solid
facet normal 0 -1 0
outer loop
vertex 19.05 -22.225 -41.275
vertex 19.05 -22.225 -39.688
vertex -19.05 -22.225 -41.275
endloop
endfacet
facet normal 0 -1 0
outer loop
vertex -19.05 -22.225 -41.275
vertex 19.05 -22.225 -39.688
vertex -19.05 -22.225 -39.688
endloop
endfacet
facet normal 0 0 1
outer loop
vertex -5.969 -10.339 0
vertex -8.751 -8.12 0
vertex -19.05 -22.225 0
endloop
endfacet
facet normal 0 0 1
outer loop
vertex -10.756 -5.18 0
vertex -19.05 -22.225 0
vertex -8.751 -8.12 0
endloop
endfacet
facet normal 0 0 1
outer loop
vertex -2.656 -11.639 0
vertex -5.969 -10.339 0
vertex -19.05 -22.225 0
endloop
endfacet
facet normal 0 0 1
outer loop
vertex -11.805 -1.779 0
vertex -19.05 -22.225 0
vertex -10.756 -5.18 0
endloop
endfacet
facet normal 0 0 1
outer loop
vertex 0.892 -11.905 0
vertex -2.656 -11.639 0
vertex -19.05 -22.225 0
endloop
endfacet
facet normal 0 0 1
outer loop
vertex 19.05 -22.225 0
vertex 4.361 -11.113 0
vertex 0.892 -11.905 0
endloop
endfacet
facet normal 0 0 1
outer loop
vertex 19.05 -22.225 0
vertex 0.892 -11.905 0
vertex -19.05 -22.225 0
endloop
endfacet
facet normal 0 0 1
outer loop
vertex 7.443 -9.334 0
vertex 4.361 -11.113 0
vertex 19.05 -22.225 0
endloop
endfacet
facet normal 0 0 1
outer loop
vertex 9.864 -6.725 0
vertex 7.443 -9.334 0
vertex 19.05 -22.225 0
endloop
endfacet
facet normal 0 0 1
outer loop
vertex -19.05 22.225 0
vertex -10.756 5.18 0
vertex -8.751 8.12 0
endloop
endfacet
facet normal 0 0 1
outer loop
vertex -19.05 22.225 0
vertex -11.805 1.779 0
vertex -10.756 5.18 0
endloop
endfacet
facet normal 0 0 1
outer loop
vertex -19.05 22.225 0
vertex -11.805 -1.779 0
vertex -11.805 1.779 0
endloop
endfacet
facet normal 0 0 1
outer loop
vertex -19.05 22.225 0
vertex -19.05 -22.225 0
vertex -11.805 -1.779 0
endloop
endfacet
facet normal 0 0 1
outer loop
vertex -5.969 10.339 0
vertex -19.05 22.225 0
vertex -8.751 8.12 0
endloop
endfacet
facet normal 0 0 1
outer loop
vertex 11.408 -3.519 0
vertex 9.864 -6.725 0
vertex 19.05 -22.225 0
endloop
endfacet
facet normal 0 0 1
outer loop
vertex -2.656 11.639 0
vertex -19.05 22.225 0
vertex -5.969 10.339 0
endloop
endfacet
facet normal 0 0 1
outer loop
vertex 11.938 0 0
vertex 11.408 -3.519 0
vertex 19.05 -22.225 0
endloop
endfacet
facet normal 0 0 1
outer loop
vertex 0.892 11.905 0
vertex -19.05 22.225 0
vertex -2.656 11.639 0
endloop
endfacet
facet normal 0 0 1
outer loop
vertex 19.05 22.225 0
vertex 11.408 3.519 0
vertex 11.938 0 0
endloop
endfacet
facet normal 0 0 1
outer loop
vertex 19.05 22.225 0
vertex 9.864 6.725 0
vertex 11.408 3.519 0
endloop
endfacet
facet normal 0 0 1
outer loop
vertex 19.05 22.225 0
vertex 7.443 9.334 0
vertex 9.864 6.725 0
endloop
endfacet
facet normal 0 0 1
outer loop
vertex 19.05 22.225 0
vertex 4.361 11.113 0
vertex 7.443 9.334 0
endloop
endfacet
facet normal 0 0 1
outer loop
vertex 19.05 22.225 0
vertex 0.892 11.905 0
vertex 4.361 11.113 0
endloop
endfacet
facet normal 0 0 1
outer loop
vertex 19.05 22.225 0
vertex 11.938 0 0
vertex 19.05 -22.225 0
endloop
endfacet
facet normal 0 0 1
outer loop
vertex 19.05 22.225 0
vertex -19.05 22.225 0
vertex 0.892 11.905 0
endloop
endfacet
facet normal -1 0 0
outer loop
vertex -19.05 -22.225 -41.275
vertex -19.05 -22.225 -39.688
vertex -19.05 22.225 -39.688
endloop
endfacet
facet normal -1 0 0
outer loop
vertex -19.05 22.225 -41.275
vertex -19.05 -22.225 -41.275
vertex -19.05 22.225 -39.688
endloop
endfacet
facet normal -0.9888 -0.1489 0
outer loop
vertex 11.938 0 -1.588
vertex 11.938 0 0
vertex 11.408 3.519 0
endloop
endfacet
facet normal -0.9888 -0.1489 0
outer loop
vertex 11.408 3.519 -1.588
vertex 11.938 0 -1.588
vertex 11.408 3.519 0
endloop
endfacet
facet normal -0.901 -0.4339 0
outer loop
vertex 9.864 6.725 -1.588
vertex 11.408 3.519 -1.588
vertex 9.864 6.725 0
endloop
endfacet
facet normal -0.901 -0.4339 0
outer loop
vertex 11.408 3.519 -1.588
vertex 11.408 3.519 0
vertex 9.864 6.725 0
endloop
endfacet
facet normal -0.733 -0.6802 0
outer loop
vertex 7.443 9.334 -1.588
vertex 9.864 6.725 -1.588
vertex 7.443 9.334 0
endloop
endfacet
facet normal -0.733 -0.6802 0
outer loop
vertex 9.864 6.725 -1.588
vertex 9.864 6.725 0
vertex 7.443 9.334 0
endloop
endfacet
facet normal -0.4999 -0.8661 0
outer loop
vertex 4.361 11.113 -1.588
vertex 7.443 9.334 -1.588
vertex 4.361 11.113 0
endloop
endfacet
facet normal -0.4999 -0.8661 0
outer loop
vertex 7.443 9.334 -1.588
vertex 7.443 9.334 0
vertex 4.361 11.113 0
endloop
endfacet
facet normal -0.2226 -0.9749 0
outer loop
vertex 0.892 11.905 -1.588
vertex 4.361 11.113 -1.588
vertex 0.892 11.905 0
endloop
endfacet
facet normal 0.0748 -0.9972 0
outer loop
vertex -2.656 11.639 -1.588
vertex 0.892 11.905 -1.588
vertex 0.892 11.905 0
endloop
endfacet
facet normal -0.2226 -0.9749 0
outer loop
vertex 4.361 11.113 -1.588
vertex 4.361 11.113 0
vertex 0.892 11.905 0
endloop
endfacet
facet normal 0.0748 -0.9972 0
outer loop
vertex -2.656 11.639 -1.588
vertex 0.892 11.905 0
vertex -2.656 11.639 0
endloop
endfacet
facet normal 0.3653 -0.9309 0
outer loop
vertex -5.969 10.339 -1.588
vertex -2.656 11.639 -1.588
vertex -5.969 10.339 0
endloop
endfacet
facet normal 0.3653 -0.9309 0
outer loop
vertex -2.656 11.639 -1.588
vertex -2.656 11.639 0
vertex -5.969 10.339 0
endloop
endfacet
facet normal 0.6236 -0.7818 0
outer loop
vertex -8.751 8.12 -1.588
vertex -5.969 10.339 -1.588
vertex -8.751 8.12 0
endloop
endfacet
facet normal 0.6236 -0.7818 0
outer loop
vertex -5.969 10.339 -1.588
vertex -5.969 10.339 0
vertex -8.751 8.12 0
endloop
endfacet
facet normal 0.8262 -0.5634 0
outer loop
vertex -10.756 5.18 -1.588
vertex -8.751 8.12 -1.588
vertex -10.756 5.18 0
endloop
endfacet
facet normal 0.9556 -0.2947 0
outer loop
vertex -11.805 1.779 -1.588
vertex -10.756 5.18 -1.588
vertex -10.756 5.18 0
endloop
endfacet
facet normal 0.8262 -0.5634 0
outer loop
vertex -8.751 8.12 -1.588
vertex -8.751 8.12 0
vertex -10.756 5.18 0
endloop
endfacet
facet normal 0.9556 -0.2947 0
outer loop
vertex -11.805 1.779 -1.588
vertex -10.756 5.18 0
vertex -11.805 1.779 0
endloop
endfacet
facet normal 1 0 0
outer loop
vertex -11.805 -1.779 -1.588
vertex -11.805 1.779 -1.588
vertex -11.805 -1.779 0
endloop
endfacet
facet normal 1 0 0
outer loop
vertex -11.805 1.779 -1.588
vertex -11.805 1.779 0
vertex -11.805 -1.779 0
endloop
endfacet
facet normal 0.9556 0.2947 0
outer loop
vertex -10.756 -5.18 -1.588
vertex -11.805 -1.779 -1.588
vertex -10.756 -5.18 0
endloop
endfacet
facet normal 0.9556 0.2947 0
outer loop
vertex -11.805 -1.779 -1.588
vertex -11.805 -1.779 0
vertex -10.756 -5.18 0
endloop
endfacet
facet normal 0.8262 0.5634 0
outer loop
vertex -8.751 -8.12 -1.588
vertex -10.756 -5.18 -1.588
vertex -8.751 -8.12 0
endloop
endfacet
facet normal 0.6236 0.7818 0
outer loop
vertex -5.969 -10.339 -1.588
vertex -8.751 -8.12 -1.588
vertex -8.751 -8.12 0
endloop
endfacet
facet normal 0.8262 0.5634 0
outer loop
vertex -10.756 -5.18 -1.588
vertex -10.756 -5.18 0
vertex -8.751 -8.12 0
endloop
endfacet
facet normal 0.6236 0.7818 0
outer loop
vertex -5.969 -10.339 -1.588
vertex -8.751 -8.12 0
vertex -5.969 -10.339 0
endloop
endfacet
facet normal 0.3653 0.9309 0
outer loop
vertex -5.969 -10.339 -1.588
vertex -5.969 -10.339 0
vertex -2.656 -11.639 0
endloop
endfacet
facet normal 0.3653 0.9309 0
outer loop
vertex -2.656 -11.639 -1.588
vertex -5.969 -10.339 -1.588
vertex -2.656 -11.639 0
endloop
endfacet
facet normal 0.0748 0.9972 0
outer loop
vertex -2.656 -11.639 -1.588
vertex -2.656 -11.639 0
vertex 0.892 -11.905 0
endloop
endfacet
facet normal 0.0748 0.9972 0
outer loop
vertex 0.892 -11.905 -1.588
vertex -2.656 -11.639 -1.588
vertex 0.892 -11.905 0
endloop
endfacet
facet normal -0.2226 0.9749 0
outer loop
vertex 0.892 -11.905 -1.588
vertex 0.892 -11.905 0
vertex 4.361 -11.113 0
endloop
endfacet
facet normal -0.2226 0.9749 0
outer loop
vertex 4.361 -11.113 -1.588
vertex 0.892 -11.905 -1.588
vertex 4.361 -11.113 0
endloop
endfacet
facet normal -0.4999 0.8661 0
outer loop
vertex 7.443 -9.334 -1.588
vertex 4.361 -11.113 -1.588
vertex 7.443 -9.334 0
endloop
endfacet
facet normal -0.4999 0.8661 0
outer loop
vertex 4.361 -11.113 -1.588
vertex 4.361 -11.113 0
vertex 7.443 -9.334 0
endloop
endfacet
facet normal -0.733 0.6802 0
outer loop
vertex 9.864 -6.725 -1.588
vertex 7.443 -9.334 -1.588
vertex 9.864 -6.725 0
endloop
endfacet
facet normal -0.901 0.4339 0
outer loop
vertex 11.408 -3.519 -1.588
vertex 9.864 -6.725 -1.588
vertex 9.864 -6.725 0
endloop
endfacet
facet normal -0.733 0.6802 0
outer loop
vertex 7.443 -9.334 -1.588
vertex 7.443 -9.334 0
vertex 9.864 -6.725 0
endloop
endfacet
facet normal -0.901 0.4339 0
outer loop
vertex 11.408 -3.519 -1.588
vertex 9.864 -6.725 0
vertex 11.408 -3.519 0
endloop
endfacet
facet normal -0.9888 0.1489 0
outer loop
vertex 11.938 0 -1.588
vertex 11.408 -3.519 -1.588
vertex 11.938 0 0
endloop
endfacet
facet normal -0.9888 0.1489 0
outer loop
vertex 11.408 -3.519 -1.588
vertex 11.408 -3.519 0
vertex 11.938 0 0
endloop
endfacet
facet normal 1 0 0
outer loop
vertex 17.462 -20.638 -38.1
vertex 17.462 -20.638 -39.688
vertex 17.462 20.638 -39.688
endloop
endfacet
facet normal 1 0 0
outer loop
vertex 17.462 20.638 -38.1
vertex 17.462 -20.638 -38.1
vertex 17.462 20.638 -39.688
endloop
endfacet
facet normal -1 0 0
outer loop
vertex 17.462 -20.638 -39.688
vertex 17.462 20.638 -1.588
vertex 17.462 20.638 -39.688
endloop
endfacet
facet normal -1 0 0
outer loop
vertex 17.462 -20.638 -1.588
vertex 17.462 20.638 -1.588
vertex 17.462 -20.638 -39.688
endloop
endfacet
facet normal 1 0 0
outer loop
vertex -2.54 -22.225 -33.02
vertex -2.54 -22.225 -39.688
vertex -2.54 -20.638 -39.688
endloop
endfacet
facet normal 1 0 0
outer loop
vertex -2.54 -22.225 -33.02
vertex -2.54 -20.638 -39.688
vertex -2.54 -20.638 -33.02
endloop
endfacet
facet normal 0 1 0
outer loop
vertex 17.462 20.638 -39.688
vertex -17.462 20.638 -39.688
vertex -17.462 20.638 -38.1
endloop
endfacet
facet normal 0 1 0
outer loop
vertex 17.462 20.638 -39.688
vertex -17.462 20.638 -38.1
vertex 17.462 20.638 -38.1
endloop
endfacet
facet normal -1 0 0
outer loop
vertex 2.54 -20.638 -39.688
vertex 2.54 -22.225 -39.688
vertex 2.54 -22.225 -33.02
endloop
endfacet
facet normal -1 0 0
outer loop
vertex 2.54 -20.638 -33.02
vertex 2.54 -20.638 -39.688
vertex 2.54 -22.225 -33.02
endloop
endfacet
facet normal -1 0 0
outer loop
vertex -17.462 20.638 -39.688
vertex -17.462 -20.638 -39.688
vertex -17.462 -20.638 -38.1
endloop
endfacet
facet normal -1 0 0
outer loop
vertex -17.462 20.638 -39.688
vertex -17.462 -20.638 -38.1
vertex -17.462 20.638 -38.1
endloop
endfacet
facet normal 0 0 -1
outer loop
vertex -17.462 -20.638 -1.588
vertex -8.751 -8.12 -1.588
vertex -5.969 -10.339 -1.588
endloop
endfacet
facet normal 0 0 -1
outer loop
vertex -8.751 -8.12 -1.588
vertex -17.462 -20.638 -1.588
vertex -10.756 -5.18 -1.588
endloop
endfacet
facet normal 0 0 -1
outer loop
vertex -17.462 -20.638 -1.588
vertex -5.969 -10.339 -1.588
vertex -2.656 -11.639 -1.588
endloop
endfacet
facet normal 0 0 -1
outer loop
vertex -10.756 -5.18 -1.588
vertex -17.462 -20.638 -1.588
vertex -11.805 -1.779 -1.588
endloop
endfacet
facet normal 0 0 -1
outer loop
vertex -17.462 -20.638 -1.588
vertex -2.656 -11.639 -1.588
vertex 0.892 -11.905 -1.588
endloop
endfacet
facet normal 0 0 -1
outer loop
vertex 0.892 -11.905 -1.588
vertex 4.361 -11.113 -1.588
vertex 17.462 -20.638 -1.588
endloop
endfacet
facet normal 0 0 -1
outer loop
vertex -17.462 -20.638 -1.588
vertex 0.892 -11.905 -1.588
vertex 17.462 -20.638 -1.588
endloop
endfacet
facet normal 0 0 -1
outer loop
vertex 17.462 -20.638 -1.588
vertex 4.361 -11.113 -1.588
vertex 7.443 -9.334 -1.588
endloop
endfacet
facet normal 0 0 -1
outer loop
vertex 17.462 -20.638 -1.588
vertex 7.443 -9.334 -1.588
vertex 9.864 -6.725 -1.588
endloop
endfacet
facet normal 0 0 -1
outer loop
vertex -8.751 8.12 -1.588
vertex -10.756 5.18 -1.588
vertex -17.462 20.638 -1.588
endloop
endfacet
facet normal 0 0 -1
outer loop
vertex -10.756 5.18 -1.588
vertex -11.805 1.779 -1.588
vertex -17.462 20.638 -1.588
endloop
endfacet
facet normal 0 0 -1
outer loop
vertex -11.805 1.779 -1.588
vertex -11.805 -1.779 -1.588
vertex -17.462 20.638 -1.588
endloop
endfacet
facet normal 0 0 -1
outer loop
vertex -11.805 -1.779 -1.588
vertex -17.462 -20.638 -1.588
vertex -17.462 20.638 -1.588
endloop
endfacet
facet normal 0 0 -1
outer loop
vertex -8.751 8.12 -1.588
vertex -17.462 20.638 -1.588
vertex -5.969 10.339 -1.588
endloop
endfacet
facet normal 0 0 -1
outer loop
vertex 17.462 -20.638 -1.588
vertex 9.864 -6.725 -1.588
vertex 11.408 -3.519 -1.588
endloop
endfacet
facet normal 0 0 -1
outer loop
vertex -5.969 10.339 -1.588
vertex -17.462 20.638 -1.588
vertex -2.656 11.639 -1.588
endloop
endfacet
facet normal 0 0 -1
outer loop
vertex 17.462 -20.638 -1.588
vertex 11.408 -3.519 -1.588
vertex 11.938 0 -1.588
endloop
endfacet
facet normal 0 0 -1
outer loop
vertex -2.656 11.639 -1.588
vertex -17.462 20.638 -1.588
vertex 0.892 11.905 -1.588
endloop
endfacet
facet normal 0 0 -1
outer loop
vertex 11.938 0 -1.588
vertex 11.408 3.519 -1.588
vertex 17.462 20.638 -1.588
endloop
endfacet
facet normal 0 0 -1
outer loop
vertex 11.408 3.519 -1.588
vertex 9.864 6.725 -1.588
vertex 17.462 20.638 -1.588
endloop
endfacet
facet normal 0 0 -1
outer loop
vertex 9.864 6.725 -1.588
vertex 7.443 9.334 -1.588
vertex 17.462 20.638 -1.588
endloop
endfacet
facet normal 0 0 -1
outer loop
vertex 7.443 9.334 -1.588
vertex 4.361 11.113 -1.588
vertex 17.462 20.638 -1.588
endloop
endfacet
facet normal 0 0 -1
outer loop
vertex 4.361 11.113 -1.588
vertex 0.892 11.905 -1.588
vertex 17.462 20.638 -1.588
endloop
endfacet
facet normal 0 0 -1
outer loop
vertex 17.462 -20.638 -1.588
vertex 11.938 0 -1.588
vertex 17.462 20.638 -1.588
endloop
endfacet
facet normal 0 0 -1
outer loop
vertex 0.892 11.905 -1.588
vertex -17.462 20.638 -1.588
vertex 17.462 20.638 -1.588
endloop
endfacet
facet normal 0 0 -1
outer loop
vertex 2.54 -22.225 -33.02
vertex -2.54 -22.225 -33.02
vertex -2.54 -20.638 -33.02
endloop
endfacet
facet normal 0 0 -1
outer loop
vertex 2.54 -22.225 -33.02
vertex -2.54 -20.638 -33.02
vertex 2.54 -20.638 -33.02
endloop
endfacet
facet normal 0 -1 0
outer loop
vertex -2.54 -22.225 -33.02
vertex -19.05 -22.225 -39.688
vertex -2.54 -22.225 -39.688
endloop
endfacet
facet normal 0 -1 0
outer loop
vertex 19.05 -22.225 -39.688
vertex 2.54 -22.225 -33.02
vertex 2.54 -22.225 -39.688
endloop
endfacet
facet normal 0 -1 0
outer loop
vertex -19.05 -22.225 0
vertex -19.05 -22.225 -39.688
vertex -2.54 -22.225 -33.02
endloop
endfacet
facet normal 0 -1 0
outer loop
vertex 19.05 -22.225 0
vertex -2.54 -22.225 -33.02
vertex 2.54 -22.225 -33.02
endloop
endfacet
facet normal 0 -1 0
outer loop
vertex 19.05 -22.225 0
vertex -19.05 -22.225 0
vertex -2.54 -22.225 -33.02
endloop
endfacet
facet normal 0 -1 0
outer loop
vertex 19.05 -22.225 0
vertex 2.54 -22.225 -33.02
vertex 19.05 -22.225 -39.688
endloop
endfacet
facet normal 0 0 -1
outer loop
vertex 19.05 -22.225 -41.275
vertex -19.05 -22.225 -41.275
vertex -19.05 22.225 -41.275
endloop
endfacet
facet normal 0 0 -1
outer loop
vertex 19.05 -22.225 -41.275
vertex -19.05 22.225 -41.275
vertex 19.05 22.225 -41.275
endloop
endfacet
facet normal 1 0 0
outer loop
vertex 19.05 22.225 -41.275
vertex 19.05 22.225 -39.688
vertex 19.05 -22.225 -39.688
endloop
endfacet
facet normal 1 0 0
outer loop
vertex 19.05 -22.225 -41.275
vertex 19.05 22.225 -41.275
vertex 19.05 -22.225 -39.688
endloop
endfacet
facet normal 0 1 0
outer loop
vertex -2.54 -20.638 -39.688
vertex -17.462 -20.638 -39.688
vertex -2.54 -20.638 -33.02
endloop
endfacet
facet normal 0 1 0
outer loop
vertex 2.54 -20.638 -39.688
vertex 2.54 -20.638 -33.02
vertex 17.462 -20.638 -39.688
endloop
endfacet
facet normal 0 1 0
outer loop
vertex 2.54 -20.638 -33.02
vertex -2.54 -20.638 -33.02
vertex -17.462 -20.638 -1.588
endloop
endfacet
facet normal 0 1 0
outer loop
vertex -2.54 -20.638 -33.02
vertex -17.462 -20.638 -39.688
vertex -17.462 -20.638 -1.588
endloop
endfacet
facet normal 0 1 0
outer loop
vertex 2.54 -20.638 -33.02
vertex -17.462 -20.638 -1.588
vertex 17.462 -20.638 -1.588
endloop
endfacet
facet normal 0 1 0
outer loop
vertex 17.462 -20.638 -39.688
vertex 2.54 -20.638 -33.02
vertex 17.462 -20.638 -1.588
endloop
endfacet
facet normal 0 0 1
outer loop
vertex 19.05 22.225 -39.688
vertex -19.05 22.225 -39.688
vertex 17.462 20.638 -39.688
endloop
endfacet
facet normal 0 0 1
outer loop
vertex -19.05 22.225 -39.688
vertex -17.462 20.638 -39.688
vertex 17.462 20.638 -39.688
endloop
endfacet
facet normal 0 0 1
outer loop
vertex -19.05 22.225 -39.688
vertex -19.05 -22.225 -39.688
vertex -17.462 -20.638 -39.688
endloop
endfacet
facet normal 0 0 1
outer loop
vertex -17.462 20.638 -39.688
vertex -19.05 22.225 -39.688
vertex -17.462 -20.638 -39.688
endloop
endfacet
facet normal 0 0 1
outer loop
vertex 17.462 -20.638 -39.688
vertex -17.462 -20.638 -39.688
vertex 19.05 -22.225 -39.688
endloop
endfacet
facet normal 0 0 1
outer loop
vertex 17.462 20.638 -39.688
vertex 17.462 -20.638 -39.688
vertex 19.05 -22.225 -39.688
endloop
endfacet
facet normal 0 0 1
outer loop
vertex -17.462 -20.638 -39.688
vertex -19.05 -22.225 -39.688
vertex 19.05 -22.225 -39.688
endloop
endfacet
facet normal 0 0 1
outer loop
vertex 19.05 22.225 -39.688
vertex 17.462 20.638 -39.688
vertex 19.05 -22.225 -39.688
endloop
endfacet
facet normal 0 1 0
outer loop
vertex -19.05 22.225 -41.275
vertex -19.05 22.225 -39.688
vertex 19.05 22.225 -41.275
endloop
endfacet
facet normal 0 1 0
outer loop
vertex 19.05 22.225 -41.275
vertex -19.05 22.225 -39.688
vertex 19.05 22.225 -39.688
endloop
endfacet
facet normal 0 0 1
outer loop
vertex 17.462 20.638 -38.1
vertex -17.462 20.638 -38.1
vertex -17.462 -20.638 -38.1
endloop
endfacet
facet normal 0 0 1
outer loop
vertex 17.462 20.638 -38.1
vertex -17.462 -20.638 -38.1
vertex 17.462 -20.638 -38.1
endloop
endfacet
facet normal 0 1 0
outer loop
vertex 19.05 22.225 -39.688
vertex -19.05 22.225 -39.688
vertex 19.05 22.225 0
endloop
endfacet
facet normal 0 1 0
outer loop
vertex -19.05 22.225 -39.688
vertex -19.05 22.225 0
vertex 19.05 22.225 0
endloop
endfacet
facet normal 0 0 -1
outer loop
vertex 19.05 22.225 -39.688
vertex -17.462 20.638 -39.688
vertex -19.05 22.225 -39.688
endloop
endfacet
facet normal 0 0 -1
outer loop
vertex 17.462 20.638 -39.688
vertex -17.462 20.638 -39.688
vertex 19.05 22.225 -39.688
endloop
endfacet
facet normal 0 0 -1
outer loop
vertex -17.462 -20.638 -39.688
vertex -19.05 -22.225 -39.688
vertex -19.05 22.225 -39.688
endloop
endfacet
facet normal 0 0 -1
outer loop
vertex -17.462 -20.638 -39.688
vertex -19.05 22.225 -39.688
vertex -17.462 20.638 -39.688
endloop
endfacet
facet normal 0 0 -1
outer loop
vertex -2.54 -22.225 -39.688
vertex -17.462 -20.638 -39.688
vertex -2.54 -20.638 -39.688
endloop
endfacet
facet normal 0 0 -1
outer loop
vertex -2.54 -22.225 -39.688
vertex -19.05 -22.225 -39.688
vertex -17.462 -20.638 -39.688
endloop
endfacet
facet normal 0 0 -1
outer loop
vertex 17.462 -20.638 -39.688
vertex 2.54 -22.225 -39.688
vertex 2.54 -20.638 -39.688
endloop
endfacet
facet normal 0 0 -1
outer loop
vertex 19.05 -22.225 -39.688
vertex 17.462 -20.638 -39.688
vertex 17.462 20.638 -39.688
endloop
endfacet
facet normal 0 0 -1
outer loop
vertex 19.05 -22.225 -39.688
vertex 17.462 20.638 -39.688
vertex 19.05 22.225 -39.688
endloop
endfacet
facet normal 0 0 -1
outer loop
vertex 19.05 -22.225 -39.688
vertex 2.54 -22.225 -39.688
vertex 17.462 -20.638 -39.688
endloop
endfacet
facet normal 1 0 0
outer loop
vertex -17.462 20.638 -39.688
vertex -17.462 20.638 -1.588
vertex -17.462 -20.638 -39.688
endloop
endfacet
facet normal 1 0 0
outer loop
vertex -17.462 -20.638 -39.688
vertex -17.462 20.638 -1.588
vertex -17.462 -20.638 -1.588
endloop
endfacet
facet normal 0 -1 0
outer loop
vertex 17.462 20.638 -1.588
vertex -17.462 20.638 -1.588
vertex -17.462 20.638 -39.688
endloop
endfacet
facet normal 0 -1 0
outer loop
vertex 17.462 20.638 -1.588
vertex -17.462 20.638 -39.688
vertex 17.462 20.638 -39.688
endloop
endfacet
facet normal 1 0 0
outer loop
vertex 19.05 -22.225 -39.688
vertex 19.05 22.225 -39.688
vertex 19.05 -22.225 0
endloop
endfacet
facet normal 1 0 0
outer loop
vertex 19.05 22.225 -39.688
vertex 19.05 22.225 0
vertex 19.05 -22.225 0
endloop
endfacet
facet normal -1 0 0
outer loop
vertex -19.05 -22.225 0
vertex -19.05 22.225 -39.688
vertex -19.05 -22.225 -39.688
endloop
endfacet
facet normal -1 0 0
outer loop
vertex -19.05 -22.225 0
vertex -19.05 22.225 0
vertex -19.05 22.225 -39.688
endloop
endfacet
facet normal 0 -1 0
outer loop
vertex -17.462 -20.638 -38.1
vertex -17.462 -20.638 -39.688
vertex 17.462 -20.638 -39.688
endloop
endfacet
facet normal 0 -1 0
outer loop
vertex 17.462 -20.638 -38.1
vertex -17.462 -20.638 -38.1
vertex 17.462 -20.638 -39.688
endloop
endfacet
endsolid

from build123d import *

# Parameters (mm, degrees)
F0_W     = 38.1
F0_H     = 44.45
F0_R     = 11.938
F1_DEPTH = 1.5875
F2_W     = 38.1
F2_H     = 44.45
F2_W_2   = 34.925
F2_H_2   = 41.275
F3_DEPTH = 38.1
F4_W     = 5.08
F4_H     = 6.6675
F5_DEPTH = 1.5875
F7_DEPTH = 1.5875
F8_W     = 34.925
F8_H     = 41.275
F9_DEPTH = 1.5875


with BuildPart() as f1:
    # F0 (on Top) → F1 (new body)
    with BuildSketch(Plane.XY):
        Rectangle(F0_W, F0_H)
        Circle(F0_R, mode=Mode.SUBTRACT)
    extrude(amount=-F1_DEPTH)

    # F2 (on face) → F3 (join)
    with BuildSketch(Plane(origin=(0, 0, -1.5875), x_dir=(1, 0, 0), z_dir=(0, 0, -1))):
        Rectangle(F2_W, F2_H)
        Rectangle(F2_W_2, F2_H_2, mode=Mode.SUBTRACT)
    extrude(amount=F3_DEPTH)

    # F4 (on face) → F5 (cut, through all)
    with BuildSketch(Plane.XZ.offset(22.225)):
        with Locations((0, -36.35375)):
            Rectangle(F4_W, F4_H)
    extrude(amount=-F5_DEPTH, mode=Mode.SUBTRACT)


with BuildPart() as f7:
    # F6 (on face) → F7 (new body)
    with BuildSketch(Plane(origin=(0, 0, -39.6875), x_dir=(1, 0, 0), z_dir=(0, 0, -1))):
        Polygon((19.05, 22.225), (2.54, 22.225), (-2.54, 22.225), (-19.05, 22.225), (-19.05, -22.225), (19.05, -22.225), align=None)
    extrude(amount=F7_DEPTH)

    # F8 (on face) → F9 (join)
    with BuildSketch(Plane.XY.offset(-39.6875)):
        Rectangle(F8_W, F8_H)
    extrude(amount=F9_DEPTH)


solid = Compound([f1.part, f7.part])
